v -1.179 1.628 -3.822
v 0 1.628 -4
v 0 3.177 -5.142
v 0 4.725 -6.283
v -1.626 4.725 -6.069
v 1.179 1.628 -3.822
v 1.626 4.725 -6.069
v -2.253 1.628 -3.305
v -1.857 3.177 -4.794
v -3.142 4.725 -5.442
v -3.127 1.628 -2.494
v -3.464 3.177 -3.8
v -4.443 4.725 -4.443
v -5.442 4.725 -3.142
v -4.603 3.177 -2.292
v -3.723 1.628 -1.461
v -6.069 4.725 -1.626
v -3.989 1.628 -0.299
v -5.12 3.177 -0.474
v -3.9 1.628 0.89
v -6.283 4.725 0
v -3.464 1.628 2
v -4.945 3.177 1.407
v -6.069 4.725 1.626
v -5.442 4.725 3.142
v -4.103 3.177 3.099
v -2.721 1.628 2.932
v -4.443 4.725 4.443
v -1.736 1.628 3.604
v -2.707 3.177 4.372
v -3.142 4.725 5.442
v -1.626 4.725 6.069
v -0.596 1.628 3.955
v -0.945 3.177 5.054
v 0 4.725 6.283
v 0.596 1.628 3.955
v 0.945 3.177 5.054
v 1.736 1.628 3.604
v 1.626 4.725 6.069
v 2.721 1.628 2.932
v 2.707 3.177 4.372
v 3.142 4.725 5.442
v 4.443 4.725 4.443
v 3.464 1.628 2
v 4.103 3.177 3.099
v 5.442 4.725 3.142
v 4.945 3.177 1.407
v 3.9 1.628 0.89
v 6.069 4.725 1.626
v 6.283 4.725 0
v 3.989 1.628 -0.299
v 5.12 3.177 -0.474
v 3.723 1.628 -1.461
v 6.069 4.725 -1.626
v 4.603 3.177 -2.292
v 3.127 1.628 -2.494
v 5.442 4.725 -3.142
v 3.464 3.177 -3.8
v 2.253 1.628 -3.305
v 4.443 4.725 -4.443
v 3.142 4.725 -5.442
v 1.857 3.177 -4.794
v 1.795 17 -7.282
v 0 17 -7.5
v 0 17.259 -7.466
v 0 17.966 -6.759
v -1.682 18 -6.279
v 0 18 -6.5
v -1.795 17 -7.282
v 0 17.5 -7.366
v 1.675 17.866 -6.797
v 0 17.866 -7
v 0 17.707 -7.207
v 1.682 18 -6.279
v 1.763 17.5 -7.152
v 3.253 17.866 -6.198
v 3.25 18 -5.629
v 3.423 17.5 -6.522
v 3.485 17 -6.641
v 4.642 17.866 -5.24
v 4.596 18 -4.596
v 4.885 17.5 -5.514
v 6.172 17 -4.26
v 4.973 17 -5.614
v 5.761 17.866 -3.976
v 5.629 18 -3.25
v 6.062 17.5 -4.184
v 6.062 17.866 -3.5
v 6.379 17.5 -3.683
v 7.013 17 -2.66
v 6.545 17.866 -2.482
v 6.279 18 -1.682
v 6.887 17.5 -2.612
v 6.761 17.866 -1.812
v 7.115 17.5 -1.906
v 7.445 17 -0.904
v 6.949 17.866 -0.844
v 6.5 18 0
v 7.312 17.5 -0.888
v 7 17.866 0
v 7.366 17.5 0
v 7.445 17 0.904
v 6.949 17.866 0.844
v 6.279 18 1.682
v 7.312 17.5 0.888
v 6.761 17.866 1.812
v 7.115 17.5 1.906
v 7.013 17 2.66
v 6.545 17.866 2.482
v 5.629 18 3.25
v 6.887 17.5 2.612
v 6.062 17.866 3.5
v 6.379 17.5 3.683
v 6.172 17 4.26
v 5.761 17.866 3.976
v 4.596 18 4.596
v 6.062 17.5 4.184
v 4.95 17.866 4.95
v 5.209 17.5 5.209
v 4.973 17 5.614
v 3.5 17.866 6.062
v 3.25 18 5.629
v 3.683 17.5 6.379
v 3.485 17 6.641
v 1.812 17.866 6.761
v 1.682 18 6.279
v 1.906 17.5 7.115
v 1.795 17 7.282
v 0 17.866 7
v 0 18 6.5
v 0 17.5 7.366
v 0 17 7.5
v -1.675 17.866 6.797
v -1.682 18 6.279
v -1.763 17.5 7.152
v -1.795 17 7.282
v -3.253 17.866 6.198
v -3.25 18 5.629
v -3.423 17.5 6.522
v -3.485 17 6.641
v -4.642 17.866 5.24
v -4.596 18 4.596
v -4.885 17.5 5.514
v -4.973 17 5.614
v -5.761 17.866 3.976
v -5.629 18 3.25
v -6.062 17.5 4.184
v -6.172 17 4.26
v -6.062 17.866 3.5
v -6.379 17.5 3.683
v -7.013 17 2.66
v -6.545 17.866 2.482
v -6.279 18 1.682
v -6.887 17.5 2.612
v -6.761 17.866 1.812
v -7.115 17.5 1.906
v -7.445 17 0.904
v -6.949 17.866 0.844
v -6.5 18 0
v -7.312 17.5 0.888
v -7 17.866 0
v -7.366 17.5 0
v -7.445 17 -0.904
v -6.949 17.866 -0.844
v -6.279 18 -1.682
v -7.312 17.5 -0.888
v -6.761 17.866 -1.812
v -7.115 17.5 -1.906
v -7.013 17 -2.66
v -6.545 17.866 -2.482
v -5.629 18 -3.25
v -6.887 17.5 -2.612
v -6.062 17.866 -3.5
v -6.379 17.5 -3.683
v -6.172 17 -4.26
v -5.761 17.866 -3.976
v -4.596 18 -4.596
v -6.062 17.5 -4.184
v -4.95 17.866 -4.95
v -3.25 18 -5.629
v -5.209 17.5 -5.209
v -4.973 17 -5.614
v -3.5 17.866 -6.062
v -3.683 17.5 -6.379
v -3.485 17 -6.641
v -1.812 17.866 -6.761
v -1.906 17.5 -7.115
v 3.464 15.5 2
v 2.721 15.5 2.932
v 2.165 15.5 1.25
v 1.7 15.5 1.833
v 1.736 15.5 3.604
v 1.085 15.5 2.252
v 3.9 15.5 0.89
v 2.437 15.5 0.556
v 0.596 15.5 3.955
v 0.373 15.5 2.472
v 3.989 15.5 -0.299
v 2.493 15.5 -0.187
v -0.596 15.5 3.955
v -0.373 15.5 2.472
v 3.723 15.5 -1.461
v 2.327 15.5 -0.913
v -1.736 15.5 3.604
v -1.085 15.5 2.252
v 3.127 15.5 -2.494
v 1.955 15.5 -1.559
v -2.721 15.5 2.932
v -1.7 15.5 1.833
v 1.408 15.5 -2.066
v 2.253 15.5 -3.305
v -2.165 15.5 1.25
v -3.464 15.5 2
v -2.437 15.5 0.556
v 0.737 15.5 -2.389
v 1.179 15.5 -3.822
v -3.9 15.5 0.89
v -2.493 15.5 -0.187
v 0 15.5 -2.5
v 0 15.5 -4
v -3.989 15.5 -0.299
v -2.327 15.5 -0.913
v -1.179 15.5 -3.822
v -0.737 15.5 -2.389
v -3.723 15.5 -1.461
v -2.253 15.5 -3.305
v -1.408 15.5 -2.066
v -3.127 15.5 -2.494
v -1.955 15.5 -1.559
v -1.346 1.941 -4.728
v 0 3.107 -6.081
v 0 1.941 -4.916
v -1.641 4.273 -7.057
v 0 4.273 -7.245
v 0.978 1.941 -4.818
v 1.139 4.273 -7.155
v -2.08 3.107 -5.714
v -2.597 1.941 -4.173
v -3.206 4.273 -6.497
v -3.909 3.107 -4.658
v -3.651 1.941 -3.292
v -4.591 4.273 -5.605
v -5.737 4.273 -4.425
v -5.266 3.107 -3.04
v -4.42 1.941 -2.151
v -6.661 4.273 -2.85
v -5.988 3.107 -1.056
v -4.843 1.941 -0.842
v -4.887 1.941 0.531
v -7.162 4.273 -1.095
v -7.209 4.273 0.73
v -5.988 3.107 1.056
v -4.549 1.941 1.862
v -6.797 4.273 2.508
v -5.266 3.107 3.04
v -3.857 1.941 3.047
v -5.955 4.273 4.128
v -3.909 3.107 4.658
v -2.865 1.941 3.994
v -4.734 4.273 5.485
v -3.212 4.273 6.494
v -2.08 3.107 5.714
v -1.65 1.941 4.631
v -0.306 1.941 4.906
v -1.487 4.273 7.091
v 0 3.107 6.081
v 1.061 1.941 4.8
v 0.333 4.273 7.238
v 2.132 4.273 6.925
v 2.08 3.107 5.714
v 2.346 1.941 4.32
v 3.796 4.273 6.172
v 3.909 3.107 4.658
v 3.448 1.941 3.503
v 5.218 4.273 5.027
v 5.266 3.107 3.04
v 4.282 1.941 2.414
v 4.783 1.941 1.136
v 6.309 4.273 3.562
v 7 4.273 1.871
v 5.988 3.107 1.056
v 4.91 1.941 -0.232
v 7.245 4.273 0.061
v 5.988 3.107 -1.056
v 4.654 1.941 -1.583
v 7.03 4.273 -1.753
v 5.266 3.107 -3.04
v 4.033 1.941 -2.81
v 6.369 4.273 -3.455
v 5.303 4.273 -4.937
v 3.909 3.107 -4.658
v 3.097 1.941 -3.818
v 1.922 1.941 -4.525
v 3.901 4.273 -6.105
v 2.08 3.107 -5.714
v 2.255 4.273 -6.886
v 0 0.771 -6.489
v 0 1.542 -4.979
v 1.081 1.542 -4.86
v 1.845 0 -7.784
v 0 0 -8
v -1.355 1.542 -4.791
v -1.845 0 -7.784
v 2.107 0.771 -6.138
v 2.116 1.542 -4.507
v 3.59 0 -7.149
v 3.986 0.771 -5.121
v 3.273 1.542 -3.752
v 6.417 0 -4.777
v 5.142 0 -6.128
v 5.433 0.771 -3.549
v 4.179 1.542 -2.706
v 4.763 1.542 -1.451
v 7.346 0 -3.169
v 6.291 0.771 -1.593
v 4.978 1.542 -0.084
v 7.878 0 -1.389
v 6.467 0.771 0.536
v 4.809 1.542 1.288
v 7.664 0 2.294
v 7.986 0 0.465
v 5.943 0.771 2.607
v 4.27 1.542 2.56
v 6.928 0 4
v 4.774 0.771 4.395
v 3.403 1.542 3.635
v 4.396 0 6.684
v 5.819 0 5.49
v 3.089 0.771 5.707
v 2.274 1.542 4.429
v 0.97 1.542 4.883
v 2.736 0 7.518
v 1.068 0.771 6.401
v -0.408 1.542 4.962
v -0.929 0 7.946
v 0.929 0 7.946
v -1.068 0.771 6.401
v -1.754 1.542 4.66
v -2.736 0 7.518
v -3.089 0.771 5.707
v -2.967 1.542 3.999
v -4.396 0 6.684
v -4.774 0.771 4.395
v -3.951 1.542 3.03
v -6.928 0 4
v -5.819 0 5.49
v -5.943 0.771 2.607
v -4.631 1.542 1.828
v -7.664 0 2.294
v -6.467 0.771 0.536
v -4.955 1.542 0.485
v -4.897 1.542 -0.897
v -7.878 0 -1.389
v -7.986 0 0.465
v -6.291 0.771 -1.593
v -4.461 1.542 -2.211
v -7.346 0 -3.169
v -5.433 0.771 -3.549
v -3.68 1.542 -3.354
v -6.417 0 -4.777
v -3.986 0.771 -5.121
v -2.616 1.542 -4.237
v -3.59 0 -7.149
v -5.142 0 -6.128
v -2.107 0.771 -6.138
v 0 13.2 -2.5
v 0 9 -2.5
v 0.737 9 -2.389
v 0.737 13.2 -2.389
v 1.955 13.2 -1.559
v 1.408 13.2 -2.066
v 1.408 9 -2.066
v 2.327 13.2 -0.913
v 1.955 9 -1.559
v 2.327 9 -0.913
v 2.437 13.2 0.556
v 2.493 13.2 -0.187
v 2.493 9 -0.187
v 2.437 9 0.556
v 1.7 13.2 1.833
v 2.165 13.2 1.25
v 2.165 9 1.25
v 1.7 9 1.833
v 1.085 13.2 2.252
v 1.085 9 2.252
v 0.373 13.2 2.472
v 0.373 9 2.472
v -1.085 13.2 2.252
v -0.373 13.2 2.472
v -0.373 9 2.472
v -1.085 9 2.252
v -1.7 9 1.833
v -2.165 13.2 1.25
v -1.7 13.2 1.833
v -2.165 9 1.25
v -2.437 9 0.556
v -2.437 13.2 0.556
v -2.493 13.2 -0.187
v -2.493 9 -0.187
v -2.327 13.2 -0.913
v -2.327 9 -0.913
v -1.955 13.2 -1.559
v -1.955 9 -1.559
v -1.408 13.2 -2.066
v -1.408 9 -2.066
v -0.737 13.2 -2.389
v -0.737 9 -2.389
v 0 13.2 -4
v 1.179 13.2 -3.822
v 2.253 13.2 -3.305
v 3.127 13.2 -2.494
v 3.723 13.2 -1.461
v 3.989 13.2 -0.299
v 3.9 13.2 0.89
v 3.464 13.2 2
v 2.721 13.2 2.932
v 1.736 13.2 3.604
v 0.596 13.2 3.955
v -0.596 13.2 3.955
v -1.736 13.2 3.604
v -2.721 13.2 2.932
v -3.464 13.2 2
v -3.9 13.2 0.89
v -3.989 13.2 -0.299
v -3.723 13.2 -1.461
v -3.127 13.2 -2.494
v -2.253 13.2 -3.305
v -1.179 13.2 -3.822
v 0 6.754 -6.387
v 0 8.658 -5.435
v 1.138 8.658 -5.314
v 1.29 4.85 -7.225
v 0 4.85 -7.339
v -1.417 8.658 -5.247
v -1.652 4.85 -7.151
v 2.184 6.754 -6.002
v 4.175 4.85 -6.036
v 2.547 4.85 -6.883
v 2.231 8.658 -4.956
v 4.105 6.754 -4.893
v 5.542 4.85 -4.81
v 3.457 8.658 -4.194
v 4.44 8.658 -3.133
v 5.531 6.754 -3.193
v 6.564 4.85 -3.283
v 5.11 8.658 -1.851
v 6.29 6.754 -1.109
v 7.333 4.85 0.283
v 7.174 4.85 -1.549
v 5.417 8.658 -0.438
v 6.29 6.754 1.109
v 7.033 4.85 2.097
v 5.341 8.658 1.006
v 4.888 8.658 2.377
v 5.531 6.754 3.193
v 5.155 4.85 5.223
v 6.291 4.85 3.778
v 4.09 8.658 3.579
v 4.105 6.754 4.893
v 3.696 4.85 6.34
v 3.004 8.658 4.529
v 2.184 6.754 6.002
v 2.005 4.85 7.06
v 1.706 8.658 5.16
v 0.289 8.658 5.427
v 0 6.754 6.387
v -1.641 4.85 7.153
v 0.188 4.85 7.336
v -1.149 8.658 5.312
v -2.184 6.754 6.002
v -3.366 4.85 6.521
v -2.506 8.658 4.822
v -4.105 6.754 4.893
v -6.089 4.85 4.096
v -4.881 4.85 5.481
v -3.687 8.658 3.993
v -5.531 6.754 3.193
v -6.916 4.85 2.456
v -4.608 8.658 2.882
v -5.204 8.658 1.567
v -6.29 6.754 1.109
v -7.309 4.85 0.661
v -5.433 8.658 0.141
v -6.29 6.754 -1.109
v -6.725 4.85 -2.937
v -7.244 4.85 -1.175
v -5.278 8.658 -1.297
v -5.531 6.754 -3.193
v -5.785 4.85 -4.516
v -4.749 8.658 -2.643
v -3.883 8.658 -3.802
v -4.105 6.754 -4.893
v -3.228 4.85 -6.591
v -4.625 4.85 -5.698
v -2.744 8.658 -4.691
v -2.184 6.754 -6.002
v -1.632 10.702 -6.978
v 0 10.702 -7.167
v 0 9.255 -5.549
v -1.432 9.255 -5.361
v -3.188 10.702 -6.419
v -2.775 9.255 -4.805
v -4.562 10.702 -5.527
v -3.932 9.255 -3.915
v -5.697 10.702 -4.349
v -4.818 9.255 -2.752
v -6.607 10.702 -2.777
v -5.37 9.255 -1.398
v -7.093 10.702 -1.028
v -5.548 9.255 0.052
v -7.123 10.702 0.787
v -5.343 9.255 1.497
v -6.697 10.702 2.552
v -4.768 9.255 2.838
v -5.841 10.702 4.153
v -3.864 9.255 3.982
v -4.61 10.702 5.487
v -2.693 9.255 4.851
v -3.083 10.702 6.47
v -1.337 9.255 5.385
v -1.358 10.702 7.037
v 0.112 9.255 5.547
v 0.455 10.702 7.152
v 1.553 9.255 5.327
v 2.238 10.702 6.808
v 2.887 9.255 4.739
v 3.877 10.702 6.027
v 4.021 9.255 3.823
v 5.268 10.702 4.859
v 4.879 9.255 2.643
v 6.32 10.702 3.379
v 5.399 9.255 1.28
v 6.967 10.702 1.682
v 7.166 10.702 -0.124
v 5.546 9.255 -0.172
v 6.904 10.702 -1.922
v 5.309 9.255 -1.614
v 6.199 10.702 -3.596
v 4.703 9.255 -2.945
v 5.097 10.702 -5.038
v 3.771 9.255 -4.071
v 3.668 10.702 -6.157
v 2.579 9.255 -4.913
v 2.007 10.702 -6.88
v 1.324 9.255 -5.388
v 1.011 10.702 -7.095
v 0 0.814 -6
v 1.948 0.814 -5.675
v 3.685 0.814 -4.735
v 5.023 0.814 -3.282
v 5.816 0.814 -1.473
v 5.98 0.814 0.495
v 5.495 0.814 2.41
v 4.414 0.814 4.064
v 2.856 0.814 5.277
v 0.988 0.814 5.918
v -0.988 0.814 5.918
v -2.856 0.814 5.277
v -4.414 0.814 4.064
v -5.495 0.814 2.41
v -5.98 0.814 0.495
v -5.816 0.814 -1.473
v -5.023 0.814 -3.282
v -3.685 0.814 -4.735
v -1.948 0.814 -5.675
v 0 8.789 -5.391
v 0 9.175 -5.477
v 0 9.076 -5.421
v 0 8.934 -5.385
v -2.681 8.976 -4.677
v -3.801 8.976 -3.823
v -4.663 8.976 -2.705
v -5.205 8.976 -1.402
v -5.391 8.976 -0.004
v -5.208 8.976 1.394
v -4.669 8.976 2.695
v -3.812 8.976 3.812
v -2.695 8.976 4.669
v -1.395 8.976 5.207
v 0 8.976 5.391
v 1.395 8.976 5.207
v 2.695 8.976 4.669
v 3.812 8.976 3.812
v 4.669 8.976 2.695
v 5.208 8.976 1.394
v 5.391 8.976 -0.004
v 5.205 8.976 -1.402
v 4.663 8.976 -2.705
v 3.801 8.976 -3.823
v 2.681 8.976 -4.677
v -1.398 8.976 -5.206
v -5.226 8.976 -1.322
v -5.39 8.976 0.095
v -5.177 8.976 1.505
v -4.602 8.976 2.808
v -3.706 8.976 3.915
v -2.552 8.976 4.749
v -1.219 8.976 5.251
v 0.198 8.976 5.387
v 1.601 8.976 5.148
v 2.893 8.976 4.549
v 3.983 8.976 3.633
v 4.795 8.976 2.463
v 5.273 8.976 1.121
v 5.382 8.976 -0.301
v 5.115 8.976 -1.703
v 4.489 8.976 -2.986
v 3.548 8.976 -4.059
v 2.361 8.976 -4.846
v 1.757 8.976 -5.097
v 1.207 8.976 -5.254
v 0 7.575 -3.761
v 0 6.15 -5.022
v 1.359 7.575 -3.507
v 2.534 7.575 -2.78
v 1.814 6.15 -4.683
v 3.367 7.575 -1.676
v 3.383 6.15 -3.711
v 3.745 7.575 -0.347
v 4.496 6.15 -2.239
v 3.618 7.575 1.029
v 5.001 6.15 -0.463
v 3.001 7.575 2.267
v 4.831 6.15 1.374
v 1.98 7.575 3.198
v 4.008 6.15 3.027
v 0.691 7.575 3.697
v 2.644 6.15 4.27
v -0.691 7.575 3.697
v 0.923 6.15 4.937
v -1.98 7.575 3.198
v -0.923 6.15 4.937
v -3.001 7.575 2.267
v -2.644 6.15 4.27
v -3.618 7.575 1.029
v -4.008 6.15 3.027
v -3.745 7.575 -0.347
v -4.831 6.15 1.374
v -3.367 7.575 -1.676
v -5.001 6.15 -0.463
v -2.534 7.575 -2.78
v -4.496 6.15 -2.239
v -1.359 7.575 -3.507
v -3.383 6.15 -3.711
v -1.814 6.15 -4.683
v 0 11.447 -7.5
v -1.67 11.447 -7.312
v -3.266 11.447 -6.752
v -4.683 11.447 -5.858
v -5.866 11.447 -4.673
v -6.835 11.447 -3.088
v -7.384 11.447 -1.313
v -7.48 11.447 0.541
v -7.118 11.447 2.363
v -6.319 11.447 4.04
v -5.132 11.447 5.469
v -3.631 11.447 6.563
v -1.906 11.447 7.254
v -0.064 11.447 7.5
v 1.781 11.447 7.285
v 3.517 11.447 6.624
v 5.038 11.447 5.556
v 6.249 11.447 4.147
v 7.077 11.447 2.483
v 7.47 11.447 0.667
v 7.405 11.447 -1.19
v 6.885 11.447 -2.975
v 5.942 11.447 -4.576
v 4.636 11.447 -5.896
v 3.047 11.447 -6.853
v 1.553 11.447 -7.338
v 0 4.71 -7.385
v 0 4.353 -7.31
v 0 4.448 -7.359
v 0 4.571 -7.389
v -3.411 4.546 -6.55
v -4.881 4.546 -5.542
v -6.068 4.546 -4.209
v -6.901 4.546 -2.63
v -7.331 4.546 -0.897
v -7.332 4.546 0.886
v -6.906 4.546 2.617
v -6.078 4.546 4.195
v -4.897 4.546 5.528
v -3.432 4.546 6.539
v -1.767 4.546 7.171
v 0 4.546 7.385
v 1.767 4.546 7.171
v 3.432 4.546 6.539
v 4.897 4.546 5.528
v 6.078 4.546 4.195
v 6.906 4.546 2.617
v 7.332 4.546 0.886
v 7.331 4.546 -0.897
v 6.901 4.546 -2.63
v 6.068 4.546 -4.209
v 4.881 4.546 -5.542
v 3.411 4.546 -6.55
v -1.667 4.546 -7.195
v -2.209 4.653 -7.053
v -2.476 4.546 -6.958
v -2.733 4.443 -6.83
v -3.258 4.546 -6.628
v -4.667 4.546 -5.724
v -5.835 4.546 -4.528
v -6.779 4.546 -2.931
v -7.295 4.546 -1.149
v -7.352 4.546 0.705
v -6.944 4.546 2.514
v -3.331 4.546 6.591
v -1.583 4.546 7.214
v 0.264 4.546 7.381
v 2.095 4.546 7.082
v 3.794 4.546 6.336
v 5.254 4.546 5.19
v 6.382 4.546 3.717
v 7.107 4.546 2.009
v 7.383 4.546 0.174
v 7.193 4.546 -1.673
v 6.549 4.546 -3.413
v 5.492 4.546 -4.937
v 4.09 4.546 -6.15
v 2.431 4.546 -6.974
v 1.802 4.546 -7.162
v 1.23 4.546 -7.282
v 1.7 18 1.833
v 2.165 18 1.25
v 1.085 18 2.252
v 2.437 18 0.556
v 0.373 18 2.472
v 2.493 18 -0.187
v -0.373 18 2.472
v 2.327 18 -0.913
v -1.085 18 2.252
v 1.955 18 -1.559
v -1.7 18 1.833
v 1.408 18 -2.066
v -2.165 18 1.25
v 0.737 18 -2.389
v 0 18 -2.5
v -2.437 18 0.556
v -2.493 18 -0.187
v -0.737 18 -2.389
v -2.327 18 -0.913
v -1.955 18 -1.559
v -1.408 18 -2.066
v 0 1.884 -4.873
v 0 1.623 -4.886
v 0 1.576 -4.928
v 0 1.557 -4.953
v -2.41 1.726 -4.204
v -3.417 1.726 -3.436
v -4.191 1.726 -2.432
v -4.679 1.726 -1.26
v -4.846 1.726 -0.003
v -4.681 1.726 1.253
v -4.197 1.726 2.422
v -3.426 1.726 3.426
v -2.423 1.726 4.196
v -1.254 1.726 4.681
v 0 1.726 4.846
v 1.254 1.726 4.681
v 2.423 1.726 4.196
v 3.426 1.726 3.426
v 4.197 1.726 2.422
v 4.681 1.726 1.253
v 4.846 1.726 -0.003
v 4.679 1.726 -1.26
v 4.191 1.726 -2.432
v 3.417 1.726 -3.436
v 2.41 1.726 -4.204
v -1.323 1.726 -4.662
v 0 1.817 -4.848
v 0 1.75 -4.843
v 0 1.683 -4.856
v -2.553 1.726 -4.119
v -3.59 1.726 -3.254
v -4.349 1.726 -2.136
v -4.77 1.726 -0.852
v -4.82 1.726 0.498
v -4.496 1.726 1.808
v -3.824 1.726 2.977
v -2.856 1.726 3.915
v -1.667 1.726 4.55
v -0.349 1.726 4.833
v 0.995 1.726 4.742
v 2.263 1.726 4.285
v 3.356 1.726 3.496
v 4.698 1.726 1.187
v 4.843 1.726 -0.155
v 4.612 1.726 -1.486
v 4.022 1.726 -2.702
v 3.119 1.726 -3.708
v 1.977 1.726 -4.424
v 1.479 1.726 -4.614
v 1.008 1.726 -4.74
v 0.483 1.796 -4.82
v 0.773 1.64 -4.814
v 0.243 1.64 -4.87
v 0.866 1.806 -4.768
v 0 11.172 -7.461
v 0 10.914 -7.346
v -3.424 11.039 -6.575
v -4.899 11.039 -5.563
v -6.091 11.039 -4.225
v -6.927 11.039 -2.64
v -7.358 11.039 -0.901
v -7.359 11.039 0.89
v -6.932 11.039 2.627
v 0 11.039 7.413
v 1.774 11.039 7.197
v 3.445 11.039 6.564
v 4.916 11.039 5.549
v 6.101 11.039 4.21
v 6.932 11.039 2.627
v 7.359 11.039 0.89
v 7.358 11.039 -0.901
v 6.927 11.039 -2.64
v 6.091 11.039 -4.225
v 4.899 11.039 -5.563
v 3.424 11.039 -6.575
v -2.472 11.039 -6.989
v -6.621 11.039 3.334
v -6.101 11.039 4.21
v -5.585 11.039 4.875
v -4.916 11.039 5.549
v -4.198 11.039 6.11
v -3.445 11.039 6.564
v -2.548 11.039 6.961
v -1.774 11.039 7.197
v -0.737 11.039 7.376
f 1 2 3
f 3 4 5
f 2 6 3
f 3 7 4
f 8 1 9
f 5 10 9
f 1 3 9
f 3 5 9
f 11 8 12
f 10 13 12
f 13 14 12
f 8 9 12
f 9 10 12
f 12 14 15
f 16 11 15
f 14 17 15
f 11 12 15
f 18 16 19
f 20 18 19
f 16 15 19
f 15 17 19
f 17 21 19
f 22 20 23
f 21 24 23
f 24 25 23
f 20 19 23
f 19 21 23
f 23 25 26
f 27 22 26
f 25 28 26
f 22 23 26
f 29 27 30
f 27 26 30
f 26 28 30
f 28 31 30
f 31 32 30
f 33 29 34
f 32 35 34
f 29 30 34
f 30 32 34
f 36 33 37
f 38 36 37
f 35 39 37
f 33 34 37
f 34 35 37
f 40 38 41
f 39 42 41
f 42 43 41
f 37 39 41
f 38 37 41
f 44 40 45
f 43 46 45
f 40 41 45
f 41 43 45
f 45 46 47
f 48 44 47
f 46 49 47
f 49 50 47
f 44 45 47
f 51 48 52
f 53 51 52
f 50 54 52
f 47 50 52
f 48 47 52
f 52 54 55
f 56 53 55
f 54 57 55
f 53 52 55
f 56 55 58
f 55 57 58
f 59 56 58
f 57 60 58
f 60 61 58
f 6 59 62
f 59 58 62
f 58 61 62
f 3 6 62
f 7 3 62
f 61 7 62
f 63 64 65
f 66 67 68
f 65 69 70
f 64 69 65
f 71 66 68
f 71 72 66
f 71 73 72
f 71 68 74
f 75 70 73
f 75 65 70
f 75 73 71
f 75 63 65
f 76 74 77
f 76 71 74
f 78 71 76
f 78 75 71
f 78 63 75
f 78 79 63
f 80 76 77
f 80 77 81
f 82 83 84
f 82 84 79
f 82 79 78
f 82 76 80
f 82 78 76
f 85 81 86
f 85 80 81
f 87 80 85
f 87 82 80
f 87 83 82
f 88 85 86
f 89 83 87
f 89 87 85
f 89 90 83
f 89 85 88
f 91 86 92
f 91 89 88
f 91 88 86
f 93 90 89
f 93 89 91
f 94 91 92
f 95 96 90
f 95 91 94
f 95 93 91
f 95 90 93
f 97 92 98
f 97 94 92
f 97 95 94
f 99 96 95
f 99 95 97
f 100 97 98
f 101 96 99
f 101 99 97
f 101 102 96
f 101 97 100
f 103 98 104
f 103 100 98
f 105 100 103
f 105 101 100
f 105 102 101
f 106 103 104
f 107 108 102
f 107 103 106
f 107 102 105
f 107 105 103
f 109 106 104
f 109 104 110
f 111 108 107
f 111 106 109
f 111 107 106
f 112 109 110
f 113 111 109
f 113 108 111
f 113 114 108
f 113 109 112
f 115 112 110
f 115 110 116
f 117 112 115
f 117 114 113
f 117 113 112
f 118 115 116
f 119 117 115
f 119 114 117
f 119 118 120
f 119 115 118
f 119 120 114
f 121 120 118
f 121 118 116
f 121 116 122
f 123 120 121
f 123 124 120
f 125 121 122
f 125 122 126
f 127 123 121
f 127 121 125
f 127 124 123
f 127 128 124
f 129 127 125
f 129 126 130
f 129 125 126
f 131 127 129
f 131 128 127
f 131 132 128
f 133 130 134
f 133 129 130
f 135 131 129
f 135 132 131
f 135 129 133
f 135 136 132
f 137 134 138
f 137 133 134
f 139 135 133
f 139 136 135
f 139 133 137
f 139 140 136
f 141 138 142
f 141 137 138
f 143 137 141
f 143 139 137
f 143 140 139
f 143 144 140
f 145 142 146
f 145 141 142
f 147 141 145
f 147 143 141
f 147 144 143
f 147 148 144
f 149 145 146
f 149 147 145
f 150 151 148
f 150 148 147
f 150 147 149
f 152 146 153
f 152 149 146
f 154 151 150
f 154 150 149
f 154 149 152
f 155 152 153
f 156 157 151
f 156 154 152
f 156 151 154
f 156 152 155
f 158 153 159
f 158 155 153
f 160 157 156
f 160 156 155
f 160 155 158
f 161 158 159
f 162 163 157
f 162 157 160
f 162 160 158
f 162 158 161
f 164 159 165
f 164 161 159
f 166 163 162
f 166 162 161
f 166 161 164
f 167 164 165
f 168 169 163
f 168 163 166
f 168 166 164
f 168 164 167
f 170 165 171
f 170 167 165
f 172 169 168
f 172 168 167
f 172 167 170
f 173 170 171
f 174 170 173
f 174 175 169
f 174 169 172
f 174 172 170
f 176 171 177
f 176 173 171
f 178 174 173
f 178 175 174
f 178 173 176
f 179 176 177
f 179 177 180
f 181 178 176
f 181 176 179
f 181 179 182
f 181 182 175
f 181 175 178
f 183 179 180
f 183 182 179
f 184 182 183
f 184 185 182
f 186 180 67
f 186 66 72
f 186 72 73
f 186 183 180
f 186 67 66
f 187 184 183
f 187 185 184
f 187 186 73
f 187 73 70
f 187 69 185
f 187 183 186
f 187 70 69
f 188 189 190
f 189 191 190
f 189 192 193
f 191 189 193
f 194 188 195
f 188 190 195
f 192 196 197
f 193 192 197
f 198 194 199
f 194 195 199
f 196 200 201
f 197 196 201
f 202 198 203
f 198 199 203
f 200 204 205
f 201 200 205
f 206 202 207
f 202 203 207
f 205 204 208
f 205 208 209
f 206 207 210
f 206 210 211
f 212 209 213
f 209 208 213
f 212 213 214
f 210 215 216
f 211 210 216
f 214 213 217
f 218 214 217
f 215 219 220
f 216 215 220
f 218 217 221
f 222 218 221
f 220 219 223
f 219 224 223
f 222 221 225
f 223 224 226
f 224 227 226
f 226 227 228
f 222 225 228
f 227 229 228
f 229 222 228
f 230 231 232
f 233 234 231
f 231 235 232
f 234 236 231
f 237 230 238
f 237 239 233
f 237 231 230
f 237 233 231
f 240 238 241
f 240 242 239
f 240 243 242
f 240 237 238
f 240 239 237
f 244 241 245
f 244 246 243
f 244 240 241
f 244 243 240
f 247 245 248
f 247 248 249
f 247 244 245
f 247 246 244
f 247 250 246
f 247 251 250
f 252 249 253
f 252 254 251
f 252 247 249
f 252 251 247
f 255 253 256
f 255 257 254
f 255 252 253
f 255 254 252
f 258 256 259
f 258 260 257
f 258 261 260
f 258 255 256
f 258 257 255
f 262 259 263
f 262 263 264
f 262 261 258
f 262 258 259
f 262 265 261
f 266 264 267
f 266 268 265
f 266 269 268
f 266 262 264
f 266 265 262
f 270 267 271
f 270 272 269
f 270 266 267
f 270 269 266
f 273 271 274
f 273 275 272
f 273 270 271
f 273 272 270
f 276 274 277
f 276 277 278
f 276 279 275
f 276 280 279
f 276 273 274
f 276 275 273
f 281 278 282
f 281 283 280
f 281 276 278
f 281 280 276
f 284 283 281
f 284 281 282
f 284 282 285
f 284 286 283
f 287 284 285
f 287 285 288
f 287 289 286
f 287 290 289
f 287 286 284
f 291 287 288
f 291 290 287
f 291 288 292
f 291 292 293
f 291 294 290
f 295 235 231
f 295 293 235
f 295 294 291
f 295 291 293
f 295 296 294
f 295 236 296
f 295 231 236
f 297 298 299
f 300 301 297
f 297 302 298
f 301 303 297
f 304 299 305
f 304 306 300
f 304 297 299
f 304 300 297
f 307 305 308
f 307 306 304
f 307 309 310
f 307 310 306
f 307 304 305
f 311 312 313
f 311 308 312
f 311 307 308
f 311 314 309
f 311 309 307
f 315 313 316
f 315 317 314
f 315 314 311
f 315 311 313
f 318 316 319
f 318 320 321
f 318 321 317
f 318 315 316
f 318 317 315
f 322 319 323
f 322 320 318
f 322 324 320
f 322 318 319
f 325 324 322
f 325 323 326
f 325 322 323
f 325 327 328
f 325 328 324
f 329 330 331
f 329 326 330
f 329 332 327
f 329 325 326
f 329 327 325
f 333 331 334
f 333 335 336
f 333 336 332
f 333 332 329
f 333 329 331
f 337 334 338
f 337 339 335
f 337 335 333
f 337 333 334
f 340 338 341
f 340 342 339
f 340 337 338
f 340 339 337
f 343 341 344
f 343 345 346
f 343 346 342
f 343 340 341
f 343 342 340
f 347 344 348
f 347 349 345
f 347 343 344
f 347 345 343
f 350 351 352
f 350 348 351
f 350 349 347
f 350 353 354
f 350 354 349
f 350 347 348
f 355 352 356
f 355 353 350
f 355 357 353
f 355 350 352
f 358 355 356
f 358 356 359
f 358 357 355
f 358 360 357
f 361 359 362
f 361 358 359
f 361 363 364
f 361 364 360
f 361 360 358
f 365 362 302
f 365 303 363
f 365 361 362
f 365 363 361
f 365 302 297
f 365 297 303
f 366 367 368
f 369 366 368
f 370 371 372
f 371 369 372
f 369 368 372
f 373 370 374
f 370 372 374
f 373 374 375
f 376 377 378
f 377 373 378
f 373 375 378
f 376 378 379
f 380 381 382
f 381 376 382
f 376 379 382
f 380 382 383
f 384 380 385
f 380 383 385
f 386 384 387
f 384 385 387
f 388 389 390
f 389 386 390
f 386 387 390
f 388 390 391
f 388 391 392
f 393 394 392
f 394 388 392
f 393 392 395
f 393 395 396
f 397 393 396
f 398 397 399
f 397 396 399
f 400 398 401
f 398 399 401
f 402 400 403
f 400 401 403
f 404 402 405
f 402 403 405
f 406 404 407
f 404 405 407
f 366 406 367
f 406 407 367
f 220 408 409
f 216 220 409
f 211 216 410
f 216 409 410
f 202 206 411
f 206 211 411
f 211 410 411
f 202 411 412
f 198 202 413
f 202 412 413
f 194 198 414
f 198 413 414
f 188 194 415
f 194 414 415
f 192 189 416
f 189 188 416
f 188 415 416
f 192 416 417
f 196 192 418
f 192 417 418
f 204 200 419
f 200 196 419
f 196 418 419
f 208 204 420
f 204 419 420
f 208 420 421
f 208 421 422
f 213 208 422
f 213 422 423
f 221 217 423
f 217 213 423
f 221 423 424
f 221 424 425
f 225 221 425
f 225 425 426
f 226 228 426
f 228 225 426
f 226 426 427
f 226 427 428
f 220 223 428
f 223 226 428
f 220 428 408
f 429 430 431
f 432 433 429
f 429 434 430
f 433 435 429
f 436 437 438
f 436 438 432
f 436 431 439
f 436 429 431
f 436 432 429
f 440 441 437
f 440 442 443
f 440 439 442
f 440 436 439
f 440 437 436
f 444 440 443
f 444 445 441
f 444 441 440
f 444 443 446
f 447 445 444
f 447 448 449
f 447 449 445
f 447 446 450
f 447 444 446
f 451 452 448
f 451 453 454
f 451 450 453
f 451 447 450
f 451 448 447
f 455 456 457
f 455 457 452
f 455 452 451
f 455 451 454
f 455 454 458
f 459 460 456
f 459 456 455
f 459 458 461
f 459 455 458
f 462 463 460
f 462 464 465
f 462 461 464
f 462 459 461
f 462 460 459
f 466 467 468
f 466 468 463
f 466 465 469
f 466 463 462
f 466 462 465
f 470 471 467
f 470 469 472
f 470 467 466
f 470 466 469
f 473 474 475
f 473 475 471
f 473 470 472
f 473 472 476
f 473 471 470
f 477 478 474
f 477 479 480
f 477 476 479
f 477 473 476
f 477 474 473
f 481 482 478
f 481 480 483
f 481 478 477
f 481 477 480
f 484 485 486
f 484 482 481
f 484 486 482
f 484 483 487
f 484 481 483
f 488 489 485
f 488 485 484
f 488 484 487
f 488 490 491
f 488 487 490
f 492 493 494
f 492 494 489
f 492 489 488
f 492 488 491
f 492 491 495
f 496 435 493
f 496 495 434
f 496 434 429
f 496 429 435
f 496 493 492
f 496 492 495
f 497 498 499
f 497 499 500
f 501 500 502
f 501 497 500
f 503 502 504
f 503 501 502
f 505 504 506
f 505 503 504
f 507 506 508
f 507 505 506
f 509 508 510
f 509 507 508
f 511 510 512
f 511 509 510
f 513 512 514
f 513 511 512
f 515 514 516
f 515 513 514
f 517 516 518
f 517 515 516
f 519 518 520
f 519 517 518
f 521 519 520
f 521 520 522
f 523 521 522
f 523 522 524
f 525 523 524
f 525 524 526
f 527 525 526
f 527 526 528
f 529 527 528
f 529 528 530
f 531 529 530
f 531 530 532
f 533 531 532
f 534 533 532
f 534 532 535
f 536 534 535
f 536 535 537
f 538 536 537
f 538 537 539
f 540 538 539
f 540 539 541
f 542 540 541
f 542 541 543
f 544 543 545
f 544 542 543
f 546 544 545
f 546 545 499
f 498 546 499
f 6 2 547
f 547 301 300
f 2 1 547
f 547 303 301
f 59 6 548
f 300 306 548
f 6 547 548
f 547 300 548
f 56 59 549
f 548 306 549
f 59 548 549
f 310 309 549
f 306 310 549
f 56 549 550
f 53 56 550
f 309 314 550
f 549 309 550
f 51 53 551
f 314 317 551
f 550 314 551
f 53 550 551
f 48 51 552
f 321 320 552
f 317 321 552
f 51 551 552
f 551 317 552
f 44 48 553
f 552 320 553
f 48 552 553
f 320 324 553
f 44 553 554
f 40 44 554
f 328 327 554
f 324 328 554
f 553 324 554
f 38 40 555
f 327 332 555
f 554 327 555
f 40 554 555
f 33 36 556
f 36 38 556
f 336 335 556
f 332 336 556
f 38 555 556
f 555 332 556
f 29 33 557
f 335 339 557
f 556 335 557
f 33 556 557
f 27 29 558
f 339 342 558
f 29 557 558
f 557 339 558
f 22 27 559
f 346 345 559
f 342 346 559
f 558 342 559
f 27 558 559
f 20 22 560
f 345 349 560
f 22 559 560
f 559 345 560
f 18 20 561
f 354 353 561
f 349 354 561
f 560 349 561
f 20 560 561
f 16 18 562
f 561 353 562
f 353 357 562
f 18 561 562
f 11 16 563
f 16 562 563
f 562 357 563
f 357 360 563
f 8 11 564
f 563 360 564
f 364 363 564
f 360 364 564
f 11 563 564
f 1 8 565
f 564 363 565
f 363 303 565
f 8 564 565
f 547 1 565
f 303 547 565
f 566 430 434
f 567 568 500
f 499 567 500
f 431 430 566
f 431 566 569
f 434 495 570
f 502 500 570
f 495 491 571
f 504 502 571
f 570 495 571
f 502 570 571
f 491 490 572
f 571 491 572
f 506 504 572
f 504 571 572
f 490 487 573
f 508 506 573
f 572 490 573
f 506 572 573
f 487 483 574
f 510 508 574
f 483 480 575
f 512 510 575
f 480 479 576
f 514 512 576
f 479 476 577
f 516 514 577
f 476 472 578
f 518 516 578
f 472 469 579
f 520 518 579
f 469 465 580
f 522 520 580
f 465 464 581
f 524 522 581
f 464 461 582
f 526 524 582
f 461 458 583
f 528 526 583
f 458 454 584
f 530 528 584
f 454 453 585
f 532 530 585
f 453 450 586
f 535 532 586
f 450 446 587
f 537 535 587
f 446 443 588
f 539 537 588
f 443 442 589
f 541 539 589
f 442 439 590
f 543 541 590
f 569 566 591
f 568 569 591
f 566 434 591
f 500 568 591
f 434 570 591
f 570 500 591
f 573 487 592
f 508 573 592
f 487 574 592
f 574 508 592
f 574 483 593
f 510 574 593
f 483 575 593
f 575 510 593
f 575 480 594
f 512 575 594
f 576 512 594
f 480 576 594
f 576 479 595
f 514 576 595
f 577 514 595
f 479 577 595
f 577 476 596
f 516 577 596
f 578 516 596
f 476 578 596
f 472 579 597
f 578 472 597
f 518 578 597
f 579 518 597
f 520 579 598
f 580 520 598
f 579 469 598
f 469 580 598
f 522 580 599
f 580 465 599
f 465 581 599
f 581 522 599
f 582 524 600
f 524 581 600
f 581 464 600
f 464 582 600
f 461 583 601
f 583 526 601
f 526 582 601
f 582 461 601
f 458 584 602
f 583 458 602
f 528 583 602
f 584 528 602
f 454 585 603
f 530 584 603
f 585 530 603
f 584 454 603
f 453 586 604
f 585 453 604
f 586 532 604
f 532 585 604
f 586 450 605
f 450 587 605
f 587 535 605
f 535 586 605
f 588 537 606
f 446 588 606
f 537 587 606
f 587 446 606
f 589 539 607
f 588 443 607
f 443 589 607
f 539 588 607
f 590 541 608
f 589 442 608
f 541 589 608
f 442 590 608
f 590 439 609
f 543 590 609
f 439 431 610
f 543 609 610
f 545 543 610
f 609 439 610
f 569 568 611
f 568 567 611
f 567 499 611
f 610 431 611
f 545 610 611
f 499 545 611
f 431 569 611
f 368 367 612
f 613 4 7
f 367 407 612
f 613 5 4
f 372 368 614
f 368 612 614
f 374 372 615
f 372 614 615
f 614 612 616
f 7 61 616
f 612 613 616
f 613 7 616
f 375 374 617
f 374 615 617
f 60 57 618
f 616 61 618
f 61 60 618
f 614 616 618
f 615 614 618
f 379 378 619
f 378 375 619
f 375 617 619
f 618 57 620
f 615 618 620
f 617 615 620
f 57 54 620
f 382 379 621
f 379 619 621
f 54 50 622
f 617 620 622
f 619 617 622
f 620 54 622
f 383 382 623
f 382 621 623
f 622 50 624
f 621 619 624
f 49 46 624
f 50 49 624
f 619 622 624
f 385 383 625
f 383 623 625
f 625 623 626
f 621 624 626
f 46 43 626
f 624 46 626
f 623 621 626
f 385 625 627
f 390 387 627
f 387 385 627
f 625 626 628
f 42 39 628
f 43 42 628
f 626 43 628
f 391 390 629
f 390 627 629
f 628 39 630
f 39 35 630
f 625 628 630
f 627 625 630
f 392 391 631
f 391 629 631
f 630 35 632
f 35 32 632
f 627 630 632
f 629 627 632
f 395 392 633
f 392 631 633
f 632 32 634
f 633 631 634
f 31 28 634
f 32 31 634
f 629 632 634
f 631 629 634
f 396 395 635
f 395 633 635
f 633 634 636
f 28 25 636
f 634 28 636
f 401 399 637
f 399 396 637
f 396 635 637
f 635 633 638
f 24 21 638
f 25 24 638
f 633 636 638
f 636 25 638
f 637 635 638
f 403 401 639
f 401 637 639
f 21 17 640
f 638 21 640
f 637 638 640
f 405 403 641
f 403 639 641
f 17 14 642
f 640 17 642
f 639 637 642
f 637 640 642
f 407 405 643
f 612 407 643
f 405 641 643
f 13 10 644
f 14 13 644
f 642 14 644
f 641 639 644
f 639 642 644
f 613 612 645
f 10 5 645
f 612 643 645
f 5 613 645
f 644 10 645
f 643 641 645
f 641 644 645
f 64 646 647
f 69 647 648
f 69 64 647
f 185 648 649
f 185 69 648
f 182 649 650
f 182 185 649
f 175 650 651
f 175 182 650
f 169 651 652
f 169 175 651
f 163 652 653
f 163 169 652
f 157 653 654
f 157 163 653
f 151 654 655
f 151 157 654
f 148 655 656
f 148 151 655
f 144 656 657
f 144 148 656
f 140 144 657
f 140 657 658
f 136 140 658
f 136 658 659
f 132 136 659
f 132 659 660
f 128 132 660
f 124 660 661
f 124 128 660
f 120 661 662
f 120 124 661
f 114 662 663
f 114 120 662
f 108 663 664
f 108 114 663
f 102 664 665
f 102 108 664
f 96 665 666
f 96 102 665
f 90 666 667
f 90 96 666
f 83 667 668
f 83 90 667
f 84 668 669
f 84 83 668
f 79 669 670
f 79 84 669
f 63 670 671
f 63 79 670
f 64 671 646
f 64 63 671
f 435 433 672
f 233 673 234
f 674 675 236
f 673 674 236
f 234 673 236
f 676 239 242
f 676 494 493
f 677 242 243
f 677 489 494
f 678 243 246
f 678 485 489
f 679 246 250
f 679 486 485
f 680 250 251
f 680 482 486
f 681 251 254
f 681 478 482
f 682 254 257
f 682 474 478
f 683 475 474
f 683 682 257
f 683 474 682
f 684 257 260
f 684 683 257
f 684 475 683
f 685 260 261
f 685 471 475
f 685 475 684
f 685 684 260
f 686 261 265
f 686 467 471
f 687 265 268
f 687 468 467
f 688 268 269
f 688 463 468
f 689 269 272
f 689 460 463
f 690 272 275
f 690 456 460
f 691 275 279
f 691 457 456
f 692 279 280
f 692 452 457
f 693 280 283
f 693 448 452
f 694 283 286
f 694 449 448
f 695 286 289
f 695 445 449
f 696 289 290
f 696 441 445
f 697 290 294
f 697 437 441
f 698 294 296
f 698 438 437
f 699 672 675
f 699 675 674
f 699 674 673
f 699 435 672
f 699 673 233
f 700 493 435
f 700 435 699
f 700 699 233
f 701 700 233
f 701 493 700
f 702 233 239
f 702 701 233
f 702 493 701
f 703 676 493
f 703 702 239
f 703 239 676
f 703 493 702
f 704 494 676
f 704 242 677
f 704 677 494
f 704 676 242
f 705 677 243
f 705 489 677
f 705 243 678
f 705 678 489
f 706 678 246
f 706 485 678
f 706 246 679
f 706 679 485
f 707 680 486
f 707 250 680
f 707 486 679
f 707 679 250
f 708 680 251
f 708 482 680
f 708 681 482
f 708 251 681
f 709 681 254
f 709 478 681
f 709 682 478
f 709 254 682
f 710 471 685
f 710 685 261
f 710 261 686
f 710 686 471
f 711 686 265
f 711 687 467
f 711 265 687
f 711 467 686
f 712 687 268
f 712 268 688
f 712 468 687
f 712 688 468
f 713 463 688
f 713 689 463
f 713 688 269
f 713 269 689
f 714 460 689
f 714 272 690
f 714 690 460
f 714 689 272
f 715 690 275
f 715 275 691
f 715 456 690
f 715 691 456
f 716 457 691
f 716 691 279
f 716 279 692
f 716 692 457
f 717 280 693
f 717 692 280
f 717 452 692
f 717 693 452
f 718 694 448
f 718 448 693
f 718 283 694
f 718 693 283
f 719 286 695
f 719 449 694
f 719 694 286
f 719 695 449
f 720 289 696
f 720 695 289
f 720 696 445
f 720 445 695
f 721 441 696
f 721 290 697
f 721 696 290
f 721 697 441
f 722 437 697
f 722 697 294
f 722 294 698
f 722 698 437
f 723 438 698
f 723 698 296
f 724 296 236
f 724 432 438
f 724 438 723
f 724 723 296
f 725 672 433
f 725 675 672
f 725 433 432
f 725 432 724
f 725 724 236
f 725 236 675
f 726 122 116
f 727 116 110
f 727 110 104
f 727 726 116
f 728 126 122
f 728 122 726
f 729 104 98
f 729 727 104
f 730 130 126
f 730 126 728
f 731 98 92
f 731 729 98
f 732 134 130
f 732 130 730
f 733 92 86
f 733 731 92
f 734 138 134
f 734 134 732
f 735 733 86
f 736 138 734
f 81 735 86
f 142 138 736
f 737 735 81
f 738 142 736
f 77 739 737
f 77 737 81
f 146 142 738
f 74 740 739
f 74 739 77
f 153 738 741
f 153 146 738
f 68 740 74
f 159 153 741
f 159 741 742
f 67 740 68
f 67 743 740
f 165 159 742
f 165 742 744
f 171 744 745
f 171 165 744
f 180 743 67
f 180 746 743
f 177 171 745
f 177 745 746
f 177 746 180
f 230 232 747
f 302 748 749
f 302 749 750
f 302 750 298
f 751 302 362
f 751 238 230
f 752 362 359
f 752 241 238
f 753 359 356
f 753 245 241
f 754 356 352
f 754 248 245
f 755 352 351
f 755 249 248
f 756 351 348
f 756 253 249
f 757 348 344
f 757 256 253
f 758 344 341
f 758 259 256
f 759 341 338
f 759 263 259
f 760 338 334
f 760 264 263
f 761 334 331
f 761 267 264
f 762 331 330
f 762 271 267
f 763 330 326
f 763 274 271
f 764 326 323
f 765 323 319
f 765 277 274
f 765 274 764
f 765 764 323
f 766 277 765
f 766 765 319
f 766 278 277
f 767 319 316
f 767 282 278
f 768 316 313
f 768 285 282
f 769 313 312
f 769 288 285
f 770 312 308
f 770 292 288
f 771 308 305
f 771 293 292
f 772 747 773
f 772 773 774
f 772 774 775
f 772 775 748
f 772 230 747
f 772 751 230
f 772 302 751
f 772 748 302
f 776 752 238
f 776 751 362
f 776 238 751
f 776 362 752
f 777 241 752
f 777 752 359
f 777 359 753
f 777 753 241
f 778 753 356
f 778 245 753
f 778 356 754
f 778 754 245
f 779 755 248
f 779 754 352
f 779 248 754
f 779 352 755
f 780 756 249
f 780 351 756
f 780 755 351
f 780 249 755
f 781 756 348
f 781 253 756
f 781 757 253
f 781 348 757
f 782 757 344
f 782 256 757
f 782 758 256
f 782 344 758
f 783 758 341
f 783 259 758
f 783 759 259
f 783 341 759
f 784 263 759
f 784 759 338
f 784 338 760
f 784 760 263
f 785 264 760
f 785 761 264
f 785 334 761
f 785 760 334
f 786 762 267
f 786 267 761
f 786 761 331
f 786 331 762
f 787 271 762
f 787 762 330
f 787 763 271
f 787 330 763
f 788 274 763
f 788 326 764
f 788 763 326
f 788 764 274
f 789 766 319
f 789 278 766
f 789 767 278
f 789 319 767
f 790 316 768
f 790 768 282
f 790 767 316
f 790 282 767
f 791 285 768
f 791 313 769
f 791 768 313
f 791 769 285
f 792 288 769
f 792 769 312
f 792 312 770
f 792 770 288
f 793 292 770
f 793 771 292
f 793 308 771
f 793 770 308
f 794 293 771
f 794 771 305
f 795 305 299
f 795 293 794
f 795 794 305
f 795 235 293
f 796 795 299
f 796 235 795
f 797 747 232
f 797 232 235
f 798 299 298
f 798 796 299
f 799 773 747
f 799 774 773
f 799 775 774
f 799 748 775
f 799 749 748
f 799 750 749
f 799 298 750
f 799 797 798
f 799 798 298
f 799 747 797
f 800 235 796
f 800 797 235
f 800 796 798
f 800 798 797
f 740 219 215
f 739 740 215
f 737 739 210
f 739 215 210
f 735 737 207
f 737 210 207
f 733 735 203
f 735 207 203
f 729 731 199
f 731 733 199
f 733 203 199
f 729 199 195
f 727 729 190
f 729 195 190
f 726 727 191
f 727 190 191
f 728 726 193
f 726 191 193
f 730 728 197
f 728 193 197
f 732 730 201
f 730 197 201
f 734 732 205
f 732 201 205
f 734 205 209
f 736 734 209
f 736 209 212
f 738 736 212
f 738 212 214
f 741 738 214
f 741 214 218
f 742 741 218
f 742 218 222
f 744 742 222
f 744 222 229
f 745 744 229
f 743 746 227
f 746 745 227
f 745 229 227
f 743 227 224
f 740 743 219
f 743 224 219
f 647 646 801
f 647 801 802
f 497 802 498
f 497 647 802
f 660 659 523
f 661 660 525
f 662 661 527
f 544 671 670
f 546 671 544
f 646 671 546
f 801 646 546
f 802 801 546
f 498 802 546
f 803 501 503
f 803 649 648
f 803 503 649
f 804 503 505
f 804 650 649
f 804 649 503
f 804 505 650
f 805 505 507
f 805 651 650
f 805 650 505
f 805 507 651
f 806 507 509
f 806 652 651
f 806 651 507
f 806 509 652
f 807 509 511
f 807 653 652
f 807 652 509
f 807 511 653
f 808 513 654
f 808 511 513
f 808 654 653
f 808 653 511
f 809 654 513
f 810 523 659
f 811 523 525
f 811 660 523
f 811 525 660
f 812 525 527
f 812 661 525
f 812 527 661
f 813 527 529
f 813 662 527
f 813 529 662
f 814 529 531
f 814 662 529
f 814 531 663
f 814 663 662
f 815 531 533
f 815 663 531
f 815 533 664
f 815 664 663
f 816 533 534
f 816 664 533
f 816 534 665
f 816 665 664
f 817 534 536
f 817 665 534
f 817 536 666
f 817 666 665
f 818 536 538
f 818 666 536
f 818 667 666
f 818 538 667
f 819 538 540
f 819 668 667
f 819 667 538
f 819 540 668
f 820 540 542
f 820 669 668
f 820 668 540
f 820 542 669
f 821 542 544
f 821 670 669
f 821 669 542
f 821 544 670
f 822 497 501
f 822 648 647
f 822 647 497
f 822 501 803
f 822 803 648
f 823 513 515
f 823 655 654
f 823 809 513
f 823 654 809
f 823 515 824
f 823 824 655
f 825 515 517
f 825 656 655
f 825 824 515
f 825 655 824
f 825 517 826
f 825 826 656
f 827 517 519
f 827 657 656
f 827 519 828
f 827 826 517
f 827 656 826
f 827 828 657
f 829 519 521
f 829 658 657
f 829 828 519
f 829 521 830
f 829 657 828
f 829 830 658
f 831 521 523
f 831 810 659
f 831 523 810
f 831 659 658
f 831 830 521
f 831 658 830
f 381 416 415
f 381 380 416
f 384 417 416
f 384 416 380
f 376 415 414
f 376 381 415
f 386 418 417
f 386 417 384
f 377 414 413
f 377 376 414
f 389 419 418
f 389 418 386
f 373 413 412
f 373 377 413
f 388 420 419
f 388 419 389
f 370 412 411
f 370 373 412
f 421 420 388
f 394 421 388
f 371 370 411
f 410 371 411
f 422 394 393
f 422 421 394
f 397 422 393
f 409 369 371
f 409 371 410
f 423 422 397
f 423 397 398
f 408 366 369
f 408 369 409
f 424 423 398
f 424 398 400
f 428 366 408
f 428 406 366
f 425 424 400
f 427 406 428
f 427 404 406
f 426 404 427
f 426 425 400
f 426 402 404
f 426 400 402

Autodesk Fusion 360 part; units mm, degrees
sketch "Sketch1" plane through (0, 0, 0) normal (0, 1, 0) x (1, 0, 0)
sketch "Sketch2" plane through (0, 0, 0) normal (1, 0, 0) x (0, 0, -1)
  line L0 (8, 0) -> (4.6728, 1.6982)
  line L1 (4.6728, 1.6982) -> (7.5, 4.5279)
  line L2 (7.5, 4.5279) -> (5.2639, 9)
  line L3 (5.2639, 9) -> (7.5, 11)
  line L4 (7.5, 11) -> (7.5, 18)
  line L5 (7.5, 18) -> (2.5, 18)
  line L6 (2.5, 18) -> (2.5, 15.5)
  line L7 (2.5, 15.5) -> (4, 15.5)
  line L8 (4, 15.5) -> (4, 13.2)
  line L9 (4, 13.2) -> (2.5, 13.2)
  line L10 (2.5, 13.2) -> (2.5, 9)
  line L11 (2.5, 9) -> (6.2834, 4.725)
  line L12 (6.2834, 4.725) -> (4, 1.6283)
  line L13 (4, 1.6283) -> (8, 0)
  line L14 (0, 0) -> (0, 19.3777) construction
  dimension "d1" = 7.5
  dimension "d2" = 2.5
  dimension "d3" = 8
  dimension "d5" = 18
  dimension "d6" = 2.3
  dimension "d8" = 3
  dimension "d9" = 5
  dimension "d10" = 4
  dimension "d11" = 7
  dimension "d14" = 2.5
  dimension "d15" = 4
  dimension "d19" = 2
  dimension "d20" = 1
  dimension "d21" = 4
  dimension "d22" = 0.5
  dimension "d23" = 0.3681
  dimension "d24" = 1
revolve "Revolve1" add sketch "Sketch2" angle 360 about axis through (0, 0, 0) along (0, 1, 0)
fillet "Fillet1" radius 1 1 edges at (-6.9925, 18, -2.7121)
fillet "Fillet2" radius 1 1 edges at (-6.9925, 11, -2.7121)
fillet "Fillet2" radius 0.5 1 edges at (-6.9925, 4.5279, -2.7121)
fillet "Fillet3" radius 0.25 1 edges at (-4.3565, 1.6982, -1.6897)
fillet "Fillet4" radius 0.5 1 edges at (-4.9077, 9, -1.9035)
